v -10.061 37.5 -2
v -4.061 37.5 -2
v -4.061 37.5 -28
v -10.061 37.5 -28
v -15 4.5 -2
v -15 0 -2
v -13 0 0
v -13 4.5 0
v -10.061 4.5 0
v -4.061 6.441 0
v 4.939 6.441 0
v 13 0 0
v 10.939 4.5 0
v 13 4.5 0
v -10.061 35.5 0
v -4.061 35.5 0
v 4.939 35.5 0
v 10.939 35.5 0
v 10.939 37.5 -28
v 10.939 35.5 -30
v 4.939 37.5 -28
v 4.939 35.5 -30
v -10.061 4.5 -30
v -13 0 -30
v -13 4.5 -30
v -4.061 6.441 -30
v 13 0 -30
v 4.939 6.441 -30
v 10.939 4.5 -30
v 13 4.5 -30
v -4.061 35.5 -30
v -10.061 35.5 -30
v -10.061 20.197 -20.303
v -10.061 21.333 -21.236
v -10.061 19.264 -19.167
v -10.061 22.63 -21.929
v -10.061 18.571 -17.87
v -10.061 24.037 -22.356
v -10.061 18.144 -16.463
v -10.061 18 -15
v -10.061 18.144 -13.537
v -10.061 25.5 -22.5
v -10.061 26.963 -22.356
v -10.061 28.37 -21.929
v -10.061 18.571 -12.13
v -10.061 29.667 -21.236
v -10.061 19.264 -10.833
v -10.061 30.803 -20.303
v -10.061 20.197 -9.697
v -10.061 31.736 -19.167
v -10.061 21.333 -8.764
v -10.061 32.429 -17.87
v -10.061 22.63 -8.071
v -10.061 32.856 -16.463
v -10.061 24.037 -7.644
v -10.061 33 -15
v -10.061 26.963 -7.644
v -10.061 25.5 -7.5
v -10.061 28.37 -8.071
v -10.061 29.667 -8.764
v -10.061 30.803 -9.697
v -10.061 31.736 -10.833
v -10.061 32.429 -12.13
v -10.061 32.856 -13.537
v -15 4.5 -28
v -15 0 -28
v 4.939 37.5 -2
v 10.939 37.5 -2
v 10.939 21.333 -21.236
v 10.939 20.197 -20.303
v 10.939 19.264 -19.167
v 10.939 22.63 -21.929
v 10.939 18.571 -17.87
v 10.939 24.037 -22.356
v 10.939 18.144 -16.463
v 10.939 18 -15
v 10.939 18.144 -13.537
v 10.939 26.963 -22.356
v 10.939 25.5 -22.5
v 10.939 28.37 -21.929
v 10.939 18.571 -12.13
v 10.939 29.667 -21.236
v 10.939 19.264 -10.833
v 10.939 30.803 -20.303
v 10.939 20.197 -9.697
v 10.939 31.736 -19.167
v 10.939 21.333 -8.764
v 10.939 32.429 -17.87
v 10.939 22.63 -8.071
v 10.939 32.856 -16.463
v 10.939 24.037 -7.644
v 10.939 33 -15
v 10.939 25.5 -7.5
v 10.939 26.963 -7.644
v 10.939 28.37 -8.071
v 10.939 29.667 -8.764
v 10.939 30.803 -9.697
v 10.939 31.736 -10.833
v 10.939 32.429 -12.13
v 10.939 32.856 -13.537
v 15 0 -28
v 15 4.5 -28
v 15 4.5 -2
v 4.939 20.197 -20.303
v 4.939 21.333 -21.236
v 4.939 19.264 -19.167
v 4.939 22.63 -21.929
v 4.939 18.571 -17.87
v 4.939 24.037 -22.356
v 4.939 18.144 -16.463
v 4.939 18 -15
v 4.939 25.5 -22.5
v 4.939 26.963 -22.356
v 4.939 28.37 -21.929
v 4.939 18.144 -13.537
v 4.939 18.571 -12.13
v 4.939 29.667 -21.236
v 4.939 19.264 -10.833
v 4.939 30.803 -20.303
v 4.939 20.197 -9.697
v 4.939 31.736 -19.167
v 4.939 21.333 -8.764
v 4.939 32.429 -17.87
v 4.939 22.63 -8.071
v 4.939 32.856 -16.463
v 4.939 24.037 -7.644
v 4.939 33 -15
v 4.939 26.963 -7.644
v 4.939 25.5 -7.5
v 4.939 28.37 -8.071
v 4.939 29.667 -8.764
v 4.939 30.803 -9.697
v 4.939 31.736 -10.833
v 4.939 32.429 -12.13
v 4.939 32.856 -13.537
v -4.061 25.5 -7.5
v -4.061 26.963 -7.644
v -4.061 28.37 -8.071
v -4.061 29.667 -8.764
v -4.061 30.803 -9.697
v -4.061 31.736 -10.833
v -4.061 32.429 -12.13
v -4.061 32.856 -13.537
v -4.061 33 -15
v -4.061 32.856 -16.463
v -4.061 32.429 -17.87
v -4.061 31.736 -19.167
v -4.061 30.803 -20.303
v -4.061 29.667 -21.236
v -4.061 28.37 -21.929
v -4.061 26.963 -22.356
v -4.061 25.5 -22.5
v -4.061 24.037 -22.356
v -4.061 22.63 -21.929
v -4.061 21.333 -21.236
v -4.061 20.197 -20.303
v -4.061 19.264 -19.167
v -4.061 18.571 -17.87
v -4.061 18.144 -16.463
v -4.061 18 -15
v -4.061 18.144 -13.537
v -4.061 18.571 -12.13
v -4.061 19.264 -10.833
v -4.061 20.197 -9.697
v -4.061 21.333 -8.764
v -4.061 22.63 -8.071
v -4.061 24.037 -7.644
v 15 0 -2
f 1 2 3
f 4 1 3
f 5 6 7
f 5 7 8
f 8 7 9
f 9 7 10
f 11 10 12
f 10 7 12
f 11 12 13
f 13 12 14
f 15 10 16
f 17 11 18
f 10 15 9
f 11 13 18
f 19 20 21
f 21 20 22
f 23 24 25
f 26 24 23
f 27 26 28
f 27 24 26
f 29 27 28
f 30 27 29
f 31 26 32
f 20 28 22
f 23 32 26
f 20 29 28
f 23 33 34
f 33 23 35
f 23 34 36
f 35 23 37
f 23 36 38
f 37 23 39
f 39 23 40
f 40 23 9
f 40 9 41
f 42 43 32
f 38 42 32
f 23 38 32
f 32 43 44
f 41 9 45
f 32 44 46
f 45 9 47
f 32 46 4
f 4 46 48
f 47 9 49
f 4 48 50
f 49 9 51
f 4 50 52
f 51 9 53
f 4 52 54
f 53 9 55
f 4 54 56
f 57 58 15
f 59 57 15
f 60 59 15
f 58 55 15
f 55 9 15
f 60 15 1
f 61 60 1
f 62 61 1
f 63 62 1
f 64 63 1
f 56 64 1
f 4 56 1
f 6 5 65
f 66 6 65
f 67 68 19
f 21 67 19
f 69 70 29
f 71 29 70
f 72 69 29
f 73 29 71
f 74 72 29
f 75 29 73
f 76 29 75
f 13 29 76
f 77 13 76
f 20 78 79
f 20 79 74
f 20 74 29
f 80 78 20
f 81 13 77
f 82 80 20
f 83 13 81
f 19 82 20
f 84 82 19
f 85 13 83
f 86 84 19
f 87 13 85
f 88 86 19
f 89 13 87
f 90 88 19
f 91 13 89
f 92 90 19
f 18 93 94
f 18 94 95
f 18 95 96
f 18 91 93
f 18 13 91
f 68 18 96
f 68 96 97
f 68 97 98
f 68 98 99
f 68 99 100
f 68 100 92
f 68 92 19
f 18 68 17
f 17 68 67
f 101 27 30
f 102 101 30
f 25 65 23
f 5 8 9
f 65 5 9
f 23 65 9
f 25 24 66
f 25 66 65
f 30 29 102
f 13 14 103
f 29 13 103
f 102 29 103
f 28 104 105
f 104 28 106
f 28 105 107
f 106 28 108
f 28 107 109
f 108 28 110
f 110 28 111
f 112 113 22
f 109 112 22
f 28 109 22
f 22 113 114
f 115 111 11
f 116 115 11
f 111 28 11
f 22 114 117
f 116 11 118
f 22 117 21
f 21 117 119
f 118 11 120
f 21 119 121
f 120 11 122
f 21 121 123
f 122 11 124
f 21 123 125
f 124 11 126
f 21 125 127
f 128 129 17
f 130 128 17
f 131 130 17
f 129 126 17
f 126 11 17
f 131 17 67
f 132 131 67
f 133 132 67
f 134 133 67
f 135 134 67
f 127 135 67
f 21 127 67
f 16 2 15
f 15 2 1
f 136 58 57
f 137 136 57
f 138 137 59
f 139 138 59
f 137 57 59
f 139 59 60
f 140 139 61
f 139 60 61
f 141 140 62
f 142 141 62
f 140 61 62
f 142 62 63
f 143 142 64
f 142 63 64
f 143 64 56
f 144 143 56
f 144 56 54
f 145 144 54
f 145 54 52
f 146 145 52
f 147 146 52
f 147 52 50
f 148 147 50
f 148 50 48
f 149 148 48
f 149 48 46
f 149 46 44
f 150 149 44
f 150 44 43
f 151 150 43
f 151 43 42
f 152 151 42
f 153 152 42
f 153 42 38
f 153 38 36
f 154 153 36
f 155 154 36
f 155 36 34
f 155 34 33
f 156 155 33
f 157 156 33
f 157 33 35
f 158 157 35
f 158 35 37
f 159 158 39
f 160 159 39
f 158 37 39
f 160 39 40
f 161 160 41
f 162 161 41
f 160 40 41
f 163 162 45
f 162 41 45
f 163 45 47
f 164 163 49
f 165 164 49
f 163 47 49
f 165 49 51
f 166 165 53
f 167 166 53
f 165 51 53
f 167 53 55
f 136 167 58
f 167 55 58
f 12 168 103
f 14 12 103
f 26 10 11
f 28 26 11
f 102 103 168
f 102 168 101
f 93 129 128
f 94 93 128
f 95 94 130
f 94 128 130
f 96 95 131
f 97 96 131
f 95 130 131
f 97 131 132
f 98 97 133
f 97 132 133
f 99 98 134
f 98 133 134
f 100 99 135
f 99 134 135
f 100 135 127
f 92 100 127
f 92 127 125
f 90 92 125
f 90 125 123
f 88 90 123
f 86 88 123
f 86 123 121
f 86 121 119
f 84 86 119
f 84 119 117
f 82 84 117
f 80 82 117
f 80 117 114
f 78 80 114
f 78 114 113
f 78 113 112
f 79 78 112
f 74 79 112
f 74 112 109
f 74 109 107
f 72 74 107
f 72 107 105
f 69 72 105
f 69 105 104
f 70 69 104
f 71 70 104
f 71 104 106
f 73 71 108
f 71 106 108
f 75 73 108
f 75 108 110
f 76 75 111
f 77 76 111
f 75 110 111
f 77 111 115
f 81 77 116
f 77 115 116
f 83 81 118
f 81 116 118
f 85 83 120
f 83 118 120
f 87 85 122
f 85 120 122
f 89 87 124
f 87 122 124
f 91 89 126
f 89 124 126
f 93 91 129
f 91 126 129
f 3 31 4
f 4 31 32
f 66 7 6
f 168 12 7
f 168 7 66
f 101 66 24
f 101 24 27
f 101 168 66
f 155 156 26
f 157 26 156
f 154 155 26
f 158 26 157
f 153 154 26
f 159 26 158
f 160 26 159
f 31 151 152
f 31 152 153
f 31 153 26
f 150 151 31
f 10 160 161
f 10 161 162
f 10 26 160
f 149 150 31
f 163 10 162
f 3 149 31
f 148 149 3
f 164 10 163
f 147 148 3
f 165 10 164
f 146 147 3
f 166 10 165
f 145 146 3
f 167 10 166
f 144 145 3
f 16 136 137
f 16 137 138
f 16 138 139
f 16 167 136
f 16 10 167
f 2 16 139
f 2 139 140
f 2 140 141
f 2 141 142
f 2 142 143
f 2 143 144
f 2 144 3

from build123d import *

# Parameters (mm, degrees)
SKETCH_1_W          = 30
SKETCH_1_H          = 37.5
EXTRUDE_2_DEPTH     = 15
SKETCH_3_W          = 4.5
SKETCH_3_H          = 31.058772458
SKETCH_3_W_2        = 4.938881881
SKETCH_3_H_2        = 33
SKETCH_3_W_3        = 4.061118119
CUT_EXTRUDE_1_DEPTH = 51.311529494
SKETCH_4_R          = 7.5
CUT_EXTRUDE_2_DEPTH = 55.169268422
CHAMFER_1_SIZE      = 2


with BuildPart() as part:
    # 草图1 → 凸台-拉伸2 (new, symmetric)
    with BuildSketch(Plane(origin=(0, 0, 0), x_dir=(0, 0, -1), z_dir=(1, 0, 0))):
        with Locations((15, 18.75)):
            Rectangle(SKETCH_1_W, SKETCH_1_H)
    extrude(amount=EXTRUDE_2_DEPTH, both=True)

    # 草图3 → 切除-拉伸1 (cut, through all)
    with BuildSketch(Plane.XY):
        with Locations((-1.811118119, 21.970613771)):
            Rectangle(SKETCH_3_W, SKETCH_3_H)
        with Locations((2.688881881, 21.970613771)):
            Rectangle(SKETCH_3_W, SKETCH_3_H)
        with Locations((-12.53055906, 21)):
            Rectangle(SKETCH_3_W_2, SKETCH_3_H_2)
        with Locations((12.969440941, 21)):
            Rectangle(SKETCH_3_W_3, SKETCH_3_H_2)
    extrude(amount=-CUT_EXTRUDE_1_DEPTH, mode=Mode.SUBTRACT)

    # 草图4 → 切除-拉伸2 (cut, through all)
    with BuildSketch(Plane.ZY.offset(10.061118119)):
        with Locations((-15, 25.5)):
            Circle(SKETCH_4_R)
    extrude(amount=-CUT_EXTRUDE_2_DEPTH, mode=Mode.SUBTRACT)

    # 倒角1
    chamfer_1_edges = [part.edges().sort_by_distance(p)[0] for p in [
        (15, 2.25, -30),
        (-15, 2.25, 0),
        (15, 2.25, 0),
        (7.938881881, 37.5, 0),
        (-7.061118119, 37.5, 0),
        (7.938881881, 37.5, -30),
        (-7.061118119, 37.5, -30),
        (-15, 2.25, -30),
    ]]
    chamfer(chamfer_1_edges, length=CHAMFER_1_SIZE)


solid = part.part
